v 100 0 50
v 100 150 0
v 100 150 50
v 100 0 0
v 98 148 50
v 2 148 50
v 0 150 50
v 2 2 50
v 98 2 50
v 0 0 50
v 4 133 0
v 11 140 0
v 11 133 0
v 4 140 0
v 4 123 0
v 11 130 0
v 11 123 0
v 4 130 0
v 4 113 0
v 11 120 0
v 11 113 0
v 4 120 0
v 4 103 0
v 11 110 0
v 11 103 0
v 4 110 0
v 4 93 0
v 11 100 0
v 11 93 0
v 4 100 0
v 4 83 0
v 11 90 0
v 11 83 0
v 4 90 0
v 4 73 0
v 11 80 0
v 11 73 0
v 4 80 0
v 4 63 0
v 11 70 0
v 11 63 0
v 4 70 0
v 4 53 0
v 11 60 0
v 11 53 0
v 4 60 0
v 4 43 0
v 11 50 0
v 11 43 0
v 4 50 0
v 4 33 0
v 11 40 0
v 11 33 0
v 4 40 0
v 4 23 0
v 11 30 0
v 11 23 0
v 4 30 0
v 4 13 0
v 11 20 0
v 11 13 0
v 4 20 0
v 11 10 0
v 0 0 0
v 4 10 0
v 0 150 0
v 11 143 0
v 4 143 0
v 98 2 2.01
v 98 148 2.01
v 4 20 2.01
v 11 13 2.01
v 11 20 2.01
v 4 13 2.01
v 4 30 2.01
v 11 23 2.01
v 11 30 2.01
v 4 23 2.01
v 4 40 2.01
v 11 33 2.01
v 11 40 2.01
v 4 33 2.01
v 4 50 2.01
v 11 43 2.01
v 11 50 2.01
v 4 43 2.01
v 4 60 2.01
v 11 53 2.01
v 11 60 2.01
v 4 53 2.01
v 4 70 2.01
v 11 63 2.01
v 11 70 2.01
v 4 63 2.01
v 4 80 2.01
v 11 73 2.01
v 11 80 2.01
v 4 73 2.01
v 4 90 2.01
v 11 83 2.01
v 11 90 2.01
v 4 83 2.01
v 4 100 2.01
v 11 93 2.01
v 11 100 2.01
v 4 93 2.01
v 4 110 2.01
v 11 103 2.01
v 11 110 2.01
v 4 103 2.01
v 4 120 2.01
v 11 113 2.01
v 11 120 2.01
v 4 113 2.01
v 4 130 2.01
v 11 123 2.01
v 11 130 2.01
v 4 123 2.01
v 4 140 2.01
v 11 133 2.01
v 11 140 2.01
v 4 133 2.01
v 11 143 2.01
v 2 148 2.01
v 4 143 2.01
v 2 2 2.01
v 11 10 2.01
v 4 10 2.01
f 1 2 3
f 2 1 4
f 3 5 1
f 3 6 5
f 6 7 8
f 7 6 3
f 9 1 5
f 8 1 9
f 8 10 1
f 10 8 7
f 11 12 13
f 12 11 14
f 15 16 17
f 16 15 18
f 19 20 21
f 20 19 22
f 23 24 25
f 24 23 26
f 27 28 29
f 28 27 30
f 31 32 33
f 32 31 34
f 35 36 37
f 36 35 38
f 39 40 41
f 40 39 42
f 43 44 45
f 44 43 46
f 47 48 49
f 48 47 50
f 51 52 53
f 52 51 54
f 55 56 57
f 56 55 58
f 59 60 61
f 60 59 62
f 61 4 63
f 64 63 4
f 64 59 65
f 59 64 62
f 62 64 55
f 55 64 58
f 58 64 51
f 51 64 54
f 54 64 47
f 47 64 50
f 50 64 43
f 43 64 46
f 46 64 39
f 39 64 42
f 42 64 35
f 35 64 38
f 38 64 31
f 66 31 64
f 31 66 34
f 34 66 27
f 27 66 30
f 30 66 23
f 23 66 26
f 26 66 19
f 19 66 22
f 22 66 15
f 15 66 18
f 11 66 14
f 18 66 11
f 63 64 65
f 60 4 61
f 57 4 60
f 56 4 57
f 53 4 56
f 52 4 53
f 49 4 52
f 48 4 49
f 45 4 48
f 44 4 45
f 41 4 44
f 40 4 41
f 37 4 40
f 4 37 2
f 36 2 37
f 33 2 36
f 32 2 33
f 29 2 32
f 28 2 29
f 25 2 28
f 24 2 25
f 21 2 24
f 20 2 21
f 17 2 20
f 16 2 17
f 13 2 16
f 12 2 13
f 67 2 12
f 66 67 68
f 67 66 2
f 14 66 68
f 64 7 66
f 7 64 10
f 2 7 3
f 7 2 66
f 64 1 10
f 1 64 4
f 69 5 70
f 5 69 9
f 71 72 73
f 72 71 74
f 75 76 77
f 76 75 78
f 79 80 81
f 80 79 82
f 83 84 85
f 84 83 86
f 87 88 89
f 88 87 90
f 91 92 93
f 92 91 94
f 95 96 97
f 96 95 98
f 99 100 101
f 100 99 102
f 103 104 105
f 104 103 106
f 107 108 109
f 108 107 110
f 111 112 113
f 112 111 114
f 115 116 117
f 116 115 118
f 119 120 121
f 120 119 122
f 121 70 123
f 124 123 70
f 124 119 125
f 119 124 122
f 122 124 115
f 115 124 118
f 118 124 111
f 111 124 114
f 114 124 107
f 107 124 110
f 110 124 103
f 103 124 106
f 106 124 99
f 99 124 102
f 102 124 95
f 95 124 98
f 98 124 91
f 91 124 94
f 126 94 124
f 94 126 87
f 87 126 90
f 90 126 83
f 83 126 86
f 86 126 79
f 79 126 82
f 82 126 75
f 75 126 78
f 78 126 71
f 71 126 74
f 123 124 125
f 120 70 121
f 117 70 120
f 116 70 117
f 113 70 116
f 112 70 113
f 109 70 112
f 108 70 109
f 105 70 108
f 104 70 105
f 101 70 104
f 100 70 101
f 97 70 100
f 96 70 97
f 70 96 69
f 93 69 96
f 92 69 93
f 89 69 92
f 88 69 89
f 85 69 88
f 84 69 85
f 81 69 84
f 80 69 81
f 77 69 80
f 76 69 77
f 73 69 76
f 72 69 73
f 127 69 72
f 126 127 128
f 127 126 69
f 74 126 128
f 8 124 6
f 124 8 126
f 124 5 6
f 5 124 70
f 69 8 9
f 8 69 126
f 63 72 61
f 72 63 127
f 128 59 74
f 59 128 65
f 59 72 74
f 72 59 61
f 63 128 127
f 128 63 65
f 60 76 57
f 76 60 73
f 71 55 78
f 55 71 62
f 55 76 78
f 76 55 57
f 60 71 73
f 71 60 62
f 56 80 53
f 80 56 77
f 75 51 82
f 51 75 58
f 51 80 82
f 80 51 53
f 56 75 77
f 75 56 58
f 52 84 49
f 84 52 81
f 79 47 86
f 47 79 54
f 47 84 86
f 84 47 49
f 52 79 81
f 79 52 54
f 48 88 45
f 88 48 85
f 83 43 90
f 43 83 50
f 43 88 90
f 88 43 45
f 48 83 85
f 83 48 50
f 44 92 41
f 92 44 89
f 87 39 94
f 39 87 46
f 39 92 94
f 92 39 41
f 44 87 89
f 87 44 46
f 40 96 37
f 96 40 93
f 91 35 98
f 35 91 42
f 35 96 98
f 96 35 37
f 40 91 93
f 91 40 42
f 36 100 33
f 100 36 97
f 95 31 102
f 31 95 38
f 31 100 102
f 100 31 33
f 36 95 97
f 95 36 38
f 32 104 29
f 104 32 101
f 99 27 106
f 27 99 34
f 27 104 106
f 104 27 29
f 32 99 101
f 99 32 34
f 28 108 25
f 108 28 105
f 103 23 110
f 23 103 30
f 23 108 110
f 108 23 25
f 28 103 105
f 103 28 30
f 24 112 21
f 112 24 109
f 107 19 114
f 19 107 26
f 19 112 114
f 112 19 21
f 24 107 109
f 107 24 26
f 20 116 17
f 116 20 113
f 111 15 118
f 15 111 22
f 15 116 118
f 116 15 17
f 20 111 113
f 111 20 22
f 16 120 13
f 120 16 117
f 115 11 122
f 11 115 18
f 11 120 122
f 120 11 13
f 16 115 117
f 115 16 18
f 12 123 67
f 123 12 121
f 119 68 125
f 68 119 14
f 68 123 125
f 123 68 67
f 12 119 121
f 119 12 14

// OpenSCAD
$fn=50;

size = [ 100, 150, 50 ];
wall = [ 4, 4, 2 ];

wire_size = [ 7, 3 ];
wire_space = 7;
wires = 14;

difference()
{
    intersection()
    {
        difference(){
            cube( size );
            translate([ wall[ 0 ] / 2, wall[ 1 ] / 2, wall[ 2 ]+0.01 ])
                cube( size - wall );
        }
    }
    for( i = [1:1:wires] )
    {
        translate([ wall[ 0 ], i * ( wire_size[ 1 ] + wire_space), -wall[ 2 ] / 2 ])
            cube([ wire_size[ 0 ], wire_size[ 1 ], wall[ 2 ]*2 ]);
    }
}
